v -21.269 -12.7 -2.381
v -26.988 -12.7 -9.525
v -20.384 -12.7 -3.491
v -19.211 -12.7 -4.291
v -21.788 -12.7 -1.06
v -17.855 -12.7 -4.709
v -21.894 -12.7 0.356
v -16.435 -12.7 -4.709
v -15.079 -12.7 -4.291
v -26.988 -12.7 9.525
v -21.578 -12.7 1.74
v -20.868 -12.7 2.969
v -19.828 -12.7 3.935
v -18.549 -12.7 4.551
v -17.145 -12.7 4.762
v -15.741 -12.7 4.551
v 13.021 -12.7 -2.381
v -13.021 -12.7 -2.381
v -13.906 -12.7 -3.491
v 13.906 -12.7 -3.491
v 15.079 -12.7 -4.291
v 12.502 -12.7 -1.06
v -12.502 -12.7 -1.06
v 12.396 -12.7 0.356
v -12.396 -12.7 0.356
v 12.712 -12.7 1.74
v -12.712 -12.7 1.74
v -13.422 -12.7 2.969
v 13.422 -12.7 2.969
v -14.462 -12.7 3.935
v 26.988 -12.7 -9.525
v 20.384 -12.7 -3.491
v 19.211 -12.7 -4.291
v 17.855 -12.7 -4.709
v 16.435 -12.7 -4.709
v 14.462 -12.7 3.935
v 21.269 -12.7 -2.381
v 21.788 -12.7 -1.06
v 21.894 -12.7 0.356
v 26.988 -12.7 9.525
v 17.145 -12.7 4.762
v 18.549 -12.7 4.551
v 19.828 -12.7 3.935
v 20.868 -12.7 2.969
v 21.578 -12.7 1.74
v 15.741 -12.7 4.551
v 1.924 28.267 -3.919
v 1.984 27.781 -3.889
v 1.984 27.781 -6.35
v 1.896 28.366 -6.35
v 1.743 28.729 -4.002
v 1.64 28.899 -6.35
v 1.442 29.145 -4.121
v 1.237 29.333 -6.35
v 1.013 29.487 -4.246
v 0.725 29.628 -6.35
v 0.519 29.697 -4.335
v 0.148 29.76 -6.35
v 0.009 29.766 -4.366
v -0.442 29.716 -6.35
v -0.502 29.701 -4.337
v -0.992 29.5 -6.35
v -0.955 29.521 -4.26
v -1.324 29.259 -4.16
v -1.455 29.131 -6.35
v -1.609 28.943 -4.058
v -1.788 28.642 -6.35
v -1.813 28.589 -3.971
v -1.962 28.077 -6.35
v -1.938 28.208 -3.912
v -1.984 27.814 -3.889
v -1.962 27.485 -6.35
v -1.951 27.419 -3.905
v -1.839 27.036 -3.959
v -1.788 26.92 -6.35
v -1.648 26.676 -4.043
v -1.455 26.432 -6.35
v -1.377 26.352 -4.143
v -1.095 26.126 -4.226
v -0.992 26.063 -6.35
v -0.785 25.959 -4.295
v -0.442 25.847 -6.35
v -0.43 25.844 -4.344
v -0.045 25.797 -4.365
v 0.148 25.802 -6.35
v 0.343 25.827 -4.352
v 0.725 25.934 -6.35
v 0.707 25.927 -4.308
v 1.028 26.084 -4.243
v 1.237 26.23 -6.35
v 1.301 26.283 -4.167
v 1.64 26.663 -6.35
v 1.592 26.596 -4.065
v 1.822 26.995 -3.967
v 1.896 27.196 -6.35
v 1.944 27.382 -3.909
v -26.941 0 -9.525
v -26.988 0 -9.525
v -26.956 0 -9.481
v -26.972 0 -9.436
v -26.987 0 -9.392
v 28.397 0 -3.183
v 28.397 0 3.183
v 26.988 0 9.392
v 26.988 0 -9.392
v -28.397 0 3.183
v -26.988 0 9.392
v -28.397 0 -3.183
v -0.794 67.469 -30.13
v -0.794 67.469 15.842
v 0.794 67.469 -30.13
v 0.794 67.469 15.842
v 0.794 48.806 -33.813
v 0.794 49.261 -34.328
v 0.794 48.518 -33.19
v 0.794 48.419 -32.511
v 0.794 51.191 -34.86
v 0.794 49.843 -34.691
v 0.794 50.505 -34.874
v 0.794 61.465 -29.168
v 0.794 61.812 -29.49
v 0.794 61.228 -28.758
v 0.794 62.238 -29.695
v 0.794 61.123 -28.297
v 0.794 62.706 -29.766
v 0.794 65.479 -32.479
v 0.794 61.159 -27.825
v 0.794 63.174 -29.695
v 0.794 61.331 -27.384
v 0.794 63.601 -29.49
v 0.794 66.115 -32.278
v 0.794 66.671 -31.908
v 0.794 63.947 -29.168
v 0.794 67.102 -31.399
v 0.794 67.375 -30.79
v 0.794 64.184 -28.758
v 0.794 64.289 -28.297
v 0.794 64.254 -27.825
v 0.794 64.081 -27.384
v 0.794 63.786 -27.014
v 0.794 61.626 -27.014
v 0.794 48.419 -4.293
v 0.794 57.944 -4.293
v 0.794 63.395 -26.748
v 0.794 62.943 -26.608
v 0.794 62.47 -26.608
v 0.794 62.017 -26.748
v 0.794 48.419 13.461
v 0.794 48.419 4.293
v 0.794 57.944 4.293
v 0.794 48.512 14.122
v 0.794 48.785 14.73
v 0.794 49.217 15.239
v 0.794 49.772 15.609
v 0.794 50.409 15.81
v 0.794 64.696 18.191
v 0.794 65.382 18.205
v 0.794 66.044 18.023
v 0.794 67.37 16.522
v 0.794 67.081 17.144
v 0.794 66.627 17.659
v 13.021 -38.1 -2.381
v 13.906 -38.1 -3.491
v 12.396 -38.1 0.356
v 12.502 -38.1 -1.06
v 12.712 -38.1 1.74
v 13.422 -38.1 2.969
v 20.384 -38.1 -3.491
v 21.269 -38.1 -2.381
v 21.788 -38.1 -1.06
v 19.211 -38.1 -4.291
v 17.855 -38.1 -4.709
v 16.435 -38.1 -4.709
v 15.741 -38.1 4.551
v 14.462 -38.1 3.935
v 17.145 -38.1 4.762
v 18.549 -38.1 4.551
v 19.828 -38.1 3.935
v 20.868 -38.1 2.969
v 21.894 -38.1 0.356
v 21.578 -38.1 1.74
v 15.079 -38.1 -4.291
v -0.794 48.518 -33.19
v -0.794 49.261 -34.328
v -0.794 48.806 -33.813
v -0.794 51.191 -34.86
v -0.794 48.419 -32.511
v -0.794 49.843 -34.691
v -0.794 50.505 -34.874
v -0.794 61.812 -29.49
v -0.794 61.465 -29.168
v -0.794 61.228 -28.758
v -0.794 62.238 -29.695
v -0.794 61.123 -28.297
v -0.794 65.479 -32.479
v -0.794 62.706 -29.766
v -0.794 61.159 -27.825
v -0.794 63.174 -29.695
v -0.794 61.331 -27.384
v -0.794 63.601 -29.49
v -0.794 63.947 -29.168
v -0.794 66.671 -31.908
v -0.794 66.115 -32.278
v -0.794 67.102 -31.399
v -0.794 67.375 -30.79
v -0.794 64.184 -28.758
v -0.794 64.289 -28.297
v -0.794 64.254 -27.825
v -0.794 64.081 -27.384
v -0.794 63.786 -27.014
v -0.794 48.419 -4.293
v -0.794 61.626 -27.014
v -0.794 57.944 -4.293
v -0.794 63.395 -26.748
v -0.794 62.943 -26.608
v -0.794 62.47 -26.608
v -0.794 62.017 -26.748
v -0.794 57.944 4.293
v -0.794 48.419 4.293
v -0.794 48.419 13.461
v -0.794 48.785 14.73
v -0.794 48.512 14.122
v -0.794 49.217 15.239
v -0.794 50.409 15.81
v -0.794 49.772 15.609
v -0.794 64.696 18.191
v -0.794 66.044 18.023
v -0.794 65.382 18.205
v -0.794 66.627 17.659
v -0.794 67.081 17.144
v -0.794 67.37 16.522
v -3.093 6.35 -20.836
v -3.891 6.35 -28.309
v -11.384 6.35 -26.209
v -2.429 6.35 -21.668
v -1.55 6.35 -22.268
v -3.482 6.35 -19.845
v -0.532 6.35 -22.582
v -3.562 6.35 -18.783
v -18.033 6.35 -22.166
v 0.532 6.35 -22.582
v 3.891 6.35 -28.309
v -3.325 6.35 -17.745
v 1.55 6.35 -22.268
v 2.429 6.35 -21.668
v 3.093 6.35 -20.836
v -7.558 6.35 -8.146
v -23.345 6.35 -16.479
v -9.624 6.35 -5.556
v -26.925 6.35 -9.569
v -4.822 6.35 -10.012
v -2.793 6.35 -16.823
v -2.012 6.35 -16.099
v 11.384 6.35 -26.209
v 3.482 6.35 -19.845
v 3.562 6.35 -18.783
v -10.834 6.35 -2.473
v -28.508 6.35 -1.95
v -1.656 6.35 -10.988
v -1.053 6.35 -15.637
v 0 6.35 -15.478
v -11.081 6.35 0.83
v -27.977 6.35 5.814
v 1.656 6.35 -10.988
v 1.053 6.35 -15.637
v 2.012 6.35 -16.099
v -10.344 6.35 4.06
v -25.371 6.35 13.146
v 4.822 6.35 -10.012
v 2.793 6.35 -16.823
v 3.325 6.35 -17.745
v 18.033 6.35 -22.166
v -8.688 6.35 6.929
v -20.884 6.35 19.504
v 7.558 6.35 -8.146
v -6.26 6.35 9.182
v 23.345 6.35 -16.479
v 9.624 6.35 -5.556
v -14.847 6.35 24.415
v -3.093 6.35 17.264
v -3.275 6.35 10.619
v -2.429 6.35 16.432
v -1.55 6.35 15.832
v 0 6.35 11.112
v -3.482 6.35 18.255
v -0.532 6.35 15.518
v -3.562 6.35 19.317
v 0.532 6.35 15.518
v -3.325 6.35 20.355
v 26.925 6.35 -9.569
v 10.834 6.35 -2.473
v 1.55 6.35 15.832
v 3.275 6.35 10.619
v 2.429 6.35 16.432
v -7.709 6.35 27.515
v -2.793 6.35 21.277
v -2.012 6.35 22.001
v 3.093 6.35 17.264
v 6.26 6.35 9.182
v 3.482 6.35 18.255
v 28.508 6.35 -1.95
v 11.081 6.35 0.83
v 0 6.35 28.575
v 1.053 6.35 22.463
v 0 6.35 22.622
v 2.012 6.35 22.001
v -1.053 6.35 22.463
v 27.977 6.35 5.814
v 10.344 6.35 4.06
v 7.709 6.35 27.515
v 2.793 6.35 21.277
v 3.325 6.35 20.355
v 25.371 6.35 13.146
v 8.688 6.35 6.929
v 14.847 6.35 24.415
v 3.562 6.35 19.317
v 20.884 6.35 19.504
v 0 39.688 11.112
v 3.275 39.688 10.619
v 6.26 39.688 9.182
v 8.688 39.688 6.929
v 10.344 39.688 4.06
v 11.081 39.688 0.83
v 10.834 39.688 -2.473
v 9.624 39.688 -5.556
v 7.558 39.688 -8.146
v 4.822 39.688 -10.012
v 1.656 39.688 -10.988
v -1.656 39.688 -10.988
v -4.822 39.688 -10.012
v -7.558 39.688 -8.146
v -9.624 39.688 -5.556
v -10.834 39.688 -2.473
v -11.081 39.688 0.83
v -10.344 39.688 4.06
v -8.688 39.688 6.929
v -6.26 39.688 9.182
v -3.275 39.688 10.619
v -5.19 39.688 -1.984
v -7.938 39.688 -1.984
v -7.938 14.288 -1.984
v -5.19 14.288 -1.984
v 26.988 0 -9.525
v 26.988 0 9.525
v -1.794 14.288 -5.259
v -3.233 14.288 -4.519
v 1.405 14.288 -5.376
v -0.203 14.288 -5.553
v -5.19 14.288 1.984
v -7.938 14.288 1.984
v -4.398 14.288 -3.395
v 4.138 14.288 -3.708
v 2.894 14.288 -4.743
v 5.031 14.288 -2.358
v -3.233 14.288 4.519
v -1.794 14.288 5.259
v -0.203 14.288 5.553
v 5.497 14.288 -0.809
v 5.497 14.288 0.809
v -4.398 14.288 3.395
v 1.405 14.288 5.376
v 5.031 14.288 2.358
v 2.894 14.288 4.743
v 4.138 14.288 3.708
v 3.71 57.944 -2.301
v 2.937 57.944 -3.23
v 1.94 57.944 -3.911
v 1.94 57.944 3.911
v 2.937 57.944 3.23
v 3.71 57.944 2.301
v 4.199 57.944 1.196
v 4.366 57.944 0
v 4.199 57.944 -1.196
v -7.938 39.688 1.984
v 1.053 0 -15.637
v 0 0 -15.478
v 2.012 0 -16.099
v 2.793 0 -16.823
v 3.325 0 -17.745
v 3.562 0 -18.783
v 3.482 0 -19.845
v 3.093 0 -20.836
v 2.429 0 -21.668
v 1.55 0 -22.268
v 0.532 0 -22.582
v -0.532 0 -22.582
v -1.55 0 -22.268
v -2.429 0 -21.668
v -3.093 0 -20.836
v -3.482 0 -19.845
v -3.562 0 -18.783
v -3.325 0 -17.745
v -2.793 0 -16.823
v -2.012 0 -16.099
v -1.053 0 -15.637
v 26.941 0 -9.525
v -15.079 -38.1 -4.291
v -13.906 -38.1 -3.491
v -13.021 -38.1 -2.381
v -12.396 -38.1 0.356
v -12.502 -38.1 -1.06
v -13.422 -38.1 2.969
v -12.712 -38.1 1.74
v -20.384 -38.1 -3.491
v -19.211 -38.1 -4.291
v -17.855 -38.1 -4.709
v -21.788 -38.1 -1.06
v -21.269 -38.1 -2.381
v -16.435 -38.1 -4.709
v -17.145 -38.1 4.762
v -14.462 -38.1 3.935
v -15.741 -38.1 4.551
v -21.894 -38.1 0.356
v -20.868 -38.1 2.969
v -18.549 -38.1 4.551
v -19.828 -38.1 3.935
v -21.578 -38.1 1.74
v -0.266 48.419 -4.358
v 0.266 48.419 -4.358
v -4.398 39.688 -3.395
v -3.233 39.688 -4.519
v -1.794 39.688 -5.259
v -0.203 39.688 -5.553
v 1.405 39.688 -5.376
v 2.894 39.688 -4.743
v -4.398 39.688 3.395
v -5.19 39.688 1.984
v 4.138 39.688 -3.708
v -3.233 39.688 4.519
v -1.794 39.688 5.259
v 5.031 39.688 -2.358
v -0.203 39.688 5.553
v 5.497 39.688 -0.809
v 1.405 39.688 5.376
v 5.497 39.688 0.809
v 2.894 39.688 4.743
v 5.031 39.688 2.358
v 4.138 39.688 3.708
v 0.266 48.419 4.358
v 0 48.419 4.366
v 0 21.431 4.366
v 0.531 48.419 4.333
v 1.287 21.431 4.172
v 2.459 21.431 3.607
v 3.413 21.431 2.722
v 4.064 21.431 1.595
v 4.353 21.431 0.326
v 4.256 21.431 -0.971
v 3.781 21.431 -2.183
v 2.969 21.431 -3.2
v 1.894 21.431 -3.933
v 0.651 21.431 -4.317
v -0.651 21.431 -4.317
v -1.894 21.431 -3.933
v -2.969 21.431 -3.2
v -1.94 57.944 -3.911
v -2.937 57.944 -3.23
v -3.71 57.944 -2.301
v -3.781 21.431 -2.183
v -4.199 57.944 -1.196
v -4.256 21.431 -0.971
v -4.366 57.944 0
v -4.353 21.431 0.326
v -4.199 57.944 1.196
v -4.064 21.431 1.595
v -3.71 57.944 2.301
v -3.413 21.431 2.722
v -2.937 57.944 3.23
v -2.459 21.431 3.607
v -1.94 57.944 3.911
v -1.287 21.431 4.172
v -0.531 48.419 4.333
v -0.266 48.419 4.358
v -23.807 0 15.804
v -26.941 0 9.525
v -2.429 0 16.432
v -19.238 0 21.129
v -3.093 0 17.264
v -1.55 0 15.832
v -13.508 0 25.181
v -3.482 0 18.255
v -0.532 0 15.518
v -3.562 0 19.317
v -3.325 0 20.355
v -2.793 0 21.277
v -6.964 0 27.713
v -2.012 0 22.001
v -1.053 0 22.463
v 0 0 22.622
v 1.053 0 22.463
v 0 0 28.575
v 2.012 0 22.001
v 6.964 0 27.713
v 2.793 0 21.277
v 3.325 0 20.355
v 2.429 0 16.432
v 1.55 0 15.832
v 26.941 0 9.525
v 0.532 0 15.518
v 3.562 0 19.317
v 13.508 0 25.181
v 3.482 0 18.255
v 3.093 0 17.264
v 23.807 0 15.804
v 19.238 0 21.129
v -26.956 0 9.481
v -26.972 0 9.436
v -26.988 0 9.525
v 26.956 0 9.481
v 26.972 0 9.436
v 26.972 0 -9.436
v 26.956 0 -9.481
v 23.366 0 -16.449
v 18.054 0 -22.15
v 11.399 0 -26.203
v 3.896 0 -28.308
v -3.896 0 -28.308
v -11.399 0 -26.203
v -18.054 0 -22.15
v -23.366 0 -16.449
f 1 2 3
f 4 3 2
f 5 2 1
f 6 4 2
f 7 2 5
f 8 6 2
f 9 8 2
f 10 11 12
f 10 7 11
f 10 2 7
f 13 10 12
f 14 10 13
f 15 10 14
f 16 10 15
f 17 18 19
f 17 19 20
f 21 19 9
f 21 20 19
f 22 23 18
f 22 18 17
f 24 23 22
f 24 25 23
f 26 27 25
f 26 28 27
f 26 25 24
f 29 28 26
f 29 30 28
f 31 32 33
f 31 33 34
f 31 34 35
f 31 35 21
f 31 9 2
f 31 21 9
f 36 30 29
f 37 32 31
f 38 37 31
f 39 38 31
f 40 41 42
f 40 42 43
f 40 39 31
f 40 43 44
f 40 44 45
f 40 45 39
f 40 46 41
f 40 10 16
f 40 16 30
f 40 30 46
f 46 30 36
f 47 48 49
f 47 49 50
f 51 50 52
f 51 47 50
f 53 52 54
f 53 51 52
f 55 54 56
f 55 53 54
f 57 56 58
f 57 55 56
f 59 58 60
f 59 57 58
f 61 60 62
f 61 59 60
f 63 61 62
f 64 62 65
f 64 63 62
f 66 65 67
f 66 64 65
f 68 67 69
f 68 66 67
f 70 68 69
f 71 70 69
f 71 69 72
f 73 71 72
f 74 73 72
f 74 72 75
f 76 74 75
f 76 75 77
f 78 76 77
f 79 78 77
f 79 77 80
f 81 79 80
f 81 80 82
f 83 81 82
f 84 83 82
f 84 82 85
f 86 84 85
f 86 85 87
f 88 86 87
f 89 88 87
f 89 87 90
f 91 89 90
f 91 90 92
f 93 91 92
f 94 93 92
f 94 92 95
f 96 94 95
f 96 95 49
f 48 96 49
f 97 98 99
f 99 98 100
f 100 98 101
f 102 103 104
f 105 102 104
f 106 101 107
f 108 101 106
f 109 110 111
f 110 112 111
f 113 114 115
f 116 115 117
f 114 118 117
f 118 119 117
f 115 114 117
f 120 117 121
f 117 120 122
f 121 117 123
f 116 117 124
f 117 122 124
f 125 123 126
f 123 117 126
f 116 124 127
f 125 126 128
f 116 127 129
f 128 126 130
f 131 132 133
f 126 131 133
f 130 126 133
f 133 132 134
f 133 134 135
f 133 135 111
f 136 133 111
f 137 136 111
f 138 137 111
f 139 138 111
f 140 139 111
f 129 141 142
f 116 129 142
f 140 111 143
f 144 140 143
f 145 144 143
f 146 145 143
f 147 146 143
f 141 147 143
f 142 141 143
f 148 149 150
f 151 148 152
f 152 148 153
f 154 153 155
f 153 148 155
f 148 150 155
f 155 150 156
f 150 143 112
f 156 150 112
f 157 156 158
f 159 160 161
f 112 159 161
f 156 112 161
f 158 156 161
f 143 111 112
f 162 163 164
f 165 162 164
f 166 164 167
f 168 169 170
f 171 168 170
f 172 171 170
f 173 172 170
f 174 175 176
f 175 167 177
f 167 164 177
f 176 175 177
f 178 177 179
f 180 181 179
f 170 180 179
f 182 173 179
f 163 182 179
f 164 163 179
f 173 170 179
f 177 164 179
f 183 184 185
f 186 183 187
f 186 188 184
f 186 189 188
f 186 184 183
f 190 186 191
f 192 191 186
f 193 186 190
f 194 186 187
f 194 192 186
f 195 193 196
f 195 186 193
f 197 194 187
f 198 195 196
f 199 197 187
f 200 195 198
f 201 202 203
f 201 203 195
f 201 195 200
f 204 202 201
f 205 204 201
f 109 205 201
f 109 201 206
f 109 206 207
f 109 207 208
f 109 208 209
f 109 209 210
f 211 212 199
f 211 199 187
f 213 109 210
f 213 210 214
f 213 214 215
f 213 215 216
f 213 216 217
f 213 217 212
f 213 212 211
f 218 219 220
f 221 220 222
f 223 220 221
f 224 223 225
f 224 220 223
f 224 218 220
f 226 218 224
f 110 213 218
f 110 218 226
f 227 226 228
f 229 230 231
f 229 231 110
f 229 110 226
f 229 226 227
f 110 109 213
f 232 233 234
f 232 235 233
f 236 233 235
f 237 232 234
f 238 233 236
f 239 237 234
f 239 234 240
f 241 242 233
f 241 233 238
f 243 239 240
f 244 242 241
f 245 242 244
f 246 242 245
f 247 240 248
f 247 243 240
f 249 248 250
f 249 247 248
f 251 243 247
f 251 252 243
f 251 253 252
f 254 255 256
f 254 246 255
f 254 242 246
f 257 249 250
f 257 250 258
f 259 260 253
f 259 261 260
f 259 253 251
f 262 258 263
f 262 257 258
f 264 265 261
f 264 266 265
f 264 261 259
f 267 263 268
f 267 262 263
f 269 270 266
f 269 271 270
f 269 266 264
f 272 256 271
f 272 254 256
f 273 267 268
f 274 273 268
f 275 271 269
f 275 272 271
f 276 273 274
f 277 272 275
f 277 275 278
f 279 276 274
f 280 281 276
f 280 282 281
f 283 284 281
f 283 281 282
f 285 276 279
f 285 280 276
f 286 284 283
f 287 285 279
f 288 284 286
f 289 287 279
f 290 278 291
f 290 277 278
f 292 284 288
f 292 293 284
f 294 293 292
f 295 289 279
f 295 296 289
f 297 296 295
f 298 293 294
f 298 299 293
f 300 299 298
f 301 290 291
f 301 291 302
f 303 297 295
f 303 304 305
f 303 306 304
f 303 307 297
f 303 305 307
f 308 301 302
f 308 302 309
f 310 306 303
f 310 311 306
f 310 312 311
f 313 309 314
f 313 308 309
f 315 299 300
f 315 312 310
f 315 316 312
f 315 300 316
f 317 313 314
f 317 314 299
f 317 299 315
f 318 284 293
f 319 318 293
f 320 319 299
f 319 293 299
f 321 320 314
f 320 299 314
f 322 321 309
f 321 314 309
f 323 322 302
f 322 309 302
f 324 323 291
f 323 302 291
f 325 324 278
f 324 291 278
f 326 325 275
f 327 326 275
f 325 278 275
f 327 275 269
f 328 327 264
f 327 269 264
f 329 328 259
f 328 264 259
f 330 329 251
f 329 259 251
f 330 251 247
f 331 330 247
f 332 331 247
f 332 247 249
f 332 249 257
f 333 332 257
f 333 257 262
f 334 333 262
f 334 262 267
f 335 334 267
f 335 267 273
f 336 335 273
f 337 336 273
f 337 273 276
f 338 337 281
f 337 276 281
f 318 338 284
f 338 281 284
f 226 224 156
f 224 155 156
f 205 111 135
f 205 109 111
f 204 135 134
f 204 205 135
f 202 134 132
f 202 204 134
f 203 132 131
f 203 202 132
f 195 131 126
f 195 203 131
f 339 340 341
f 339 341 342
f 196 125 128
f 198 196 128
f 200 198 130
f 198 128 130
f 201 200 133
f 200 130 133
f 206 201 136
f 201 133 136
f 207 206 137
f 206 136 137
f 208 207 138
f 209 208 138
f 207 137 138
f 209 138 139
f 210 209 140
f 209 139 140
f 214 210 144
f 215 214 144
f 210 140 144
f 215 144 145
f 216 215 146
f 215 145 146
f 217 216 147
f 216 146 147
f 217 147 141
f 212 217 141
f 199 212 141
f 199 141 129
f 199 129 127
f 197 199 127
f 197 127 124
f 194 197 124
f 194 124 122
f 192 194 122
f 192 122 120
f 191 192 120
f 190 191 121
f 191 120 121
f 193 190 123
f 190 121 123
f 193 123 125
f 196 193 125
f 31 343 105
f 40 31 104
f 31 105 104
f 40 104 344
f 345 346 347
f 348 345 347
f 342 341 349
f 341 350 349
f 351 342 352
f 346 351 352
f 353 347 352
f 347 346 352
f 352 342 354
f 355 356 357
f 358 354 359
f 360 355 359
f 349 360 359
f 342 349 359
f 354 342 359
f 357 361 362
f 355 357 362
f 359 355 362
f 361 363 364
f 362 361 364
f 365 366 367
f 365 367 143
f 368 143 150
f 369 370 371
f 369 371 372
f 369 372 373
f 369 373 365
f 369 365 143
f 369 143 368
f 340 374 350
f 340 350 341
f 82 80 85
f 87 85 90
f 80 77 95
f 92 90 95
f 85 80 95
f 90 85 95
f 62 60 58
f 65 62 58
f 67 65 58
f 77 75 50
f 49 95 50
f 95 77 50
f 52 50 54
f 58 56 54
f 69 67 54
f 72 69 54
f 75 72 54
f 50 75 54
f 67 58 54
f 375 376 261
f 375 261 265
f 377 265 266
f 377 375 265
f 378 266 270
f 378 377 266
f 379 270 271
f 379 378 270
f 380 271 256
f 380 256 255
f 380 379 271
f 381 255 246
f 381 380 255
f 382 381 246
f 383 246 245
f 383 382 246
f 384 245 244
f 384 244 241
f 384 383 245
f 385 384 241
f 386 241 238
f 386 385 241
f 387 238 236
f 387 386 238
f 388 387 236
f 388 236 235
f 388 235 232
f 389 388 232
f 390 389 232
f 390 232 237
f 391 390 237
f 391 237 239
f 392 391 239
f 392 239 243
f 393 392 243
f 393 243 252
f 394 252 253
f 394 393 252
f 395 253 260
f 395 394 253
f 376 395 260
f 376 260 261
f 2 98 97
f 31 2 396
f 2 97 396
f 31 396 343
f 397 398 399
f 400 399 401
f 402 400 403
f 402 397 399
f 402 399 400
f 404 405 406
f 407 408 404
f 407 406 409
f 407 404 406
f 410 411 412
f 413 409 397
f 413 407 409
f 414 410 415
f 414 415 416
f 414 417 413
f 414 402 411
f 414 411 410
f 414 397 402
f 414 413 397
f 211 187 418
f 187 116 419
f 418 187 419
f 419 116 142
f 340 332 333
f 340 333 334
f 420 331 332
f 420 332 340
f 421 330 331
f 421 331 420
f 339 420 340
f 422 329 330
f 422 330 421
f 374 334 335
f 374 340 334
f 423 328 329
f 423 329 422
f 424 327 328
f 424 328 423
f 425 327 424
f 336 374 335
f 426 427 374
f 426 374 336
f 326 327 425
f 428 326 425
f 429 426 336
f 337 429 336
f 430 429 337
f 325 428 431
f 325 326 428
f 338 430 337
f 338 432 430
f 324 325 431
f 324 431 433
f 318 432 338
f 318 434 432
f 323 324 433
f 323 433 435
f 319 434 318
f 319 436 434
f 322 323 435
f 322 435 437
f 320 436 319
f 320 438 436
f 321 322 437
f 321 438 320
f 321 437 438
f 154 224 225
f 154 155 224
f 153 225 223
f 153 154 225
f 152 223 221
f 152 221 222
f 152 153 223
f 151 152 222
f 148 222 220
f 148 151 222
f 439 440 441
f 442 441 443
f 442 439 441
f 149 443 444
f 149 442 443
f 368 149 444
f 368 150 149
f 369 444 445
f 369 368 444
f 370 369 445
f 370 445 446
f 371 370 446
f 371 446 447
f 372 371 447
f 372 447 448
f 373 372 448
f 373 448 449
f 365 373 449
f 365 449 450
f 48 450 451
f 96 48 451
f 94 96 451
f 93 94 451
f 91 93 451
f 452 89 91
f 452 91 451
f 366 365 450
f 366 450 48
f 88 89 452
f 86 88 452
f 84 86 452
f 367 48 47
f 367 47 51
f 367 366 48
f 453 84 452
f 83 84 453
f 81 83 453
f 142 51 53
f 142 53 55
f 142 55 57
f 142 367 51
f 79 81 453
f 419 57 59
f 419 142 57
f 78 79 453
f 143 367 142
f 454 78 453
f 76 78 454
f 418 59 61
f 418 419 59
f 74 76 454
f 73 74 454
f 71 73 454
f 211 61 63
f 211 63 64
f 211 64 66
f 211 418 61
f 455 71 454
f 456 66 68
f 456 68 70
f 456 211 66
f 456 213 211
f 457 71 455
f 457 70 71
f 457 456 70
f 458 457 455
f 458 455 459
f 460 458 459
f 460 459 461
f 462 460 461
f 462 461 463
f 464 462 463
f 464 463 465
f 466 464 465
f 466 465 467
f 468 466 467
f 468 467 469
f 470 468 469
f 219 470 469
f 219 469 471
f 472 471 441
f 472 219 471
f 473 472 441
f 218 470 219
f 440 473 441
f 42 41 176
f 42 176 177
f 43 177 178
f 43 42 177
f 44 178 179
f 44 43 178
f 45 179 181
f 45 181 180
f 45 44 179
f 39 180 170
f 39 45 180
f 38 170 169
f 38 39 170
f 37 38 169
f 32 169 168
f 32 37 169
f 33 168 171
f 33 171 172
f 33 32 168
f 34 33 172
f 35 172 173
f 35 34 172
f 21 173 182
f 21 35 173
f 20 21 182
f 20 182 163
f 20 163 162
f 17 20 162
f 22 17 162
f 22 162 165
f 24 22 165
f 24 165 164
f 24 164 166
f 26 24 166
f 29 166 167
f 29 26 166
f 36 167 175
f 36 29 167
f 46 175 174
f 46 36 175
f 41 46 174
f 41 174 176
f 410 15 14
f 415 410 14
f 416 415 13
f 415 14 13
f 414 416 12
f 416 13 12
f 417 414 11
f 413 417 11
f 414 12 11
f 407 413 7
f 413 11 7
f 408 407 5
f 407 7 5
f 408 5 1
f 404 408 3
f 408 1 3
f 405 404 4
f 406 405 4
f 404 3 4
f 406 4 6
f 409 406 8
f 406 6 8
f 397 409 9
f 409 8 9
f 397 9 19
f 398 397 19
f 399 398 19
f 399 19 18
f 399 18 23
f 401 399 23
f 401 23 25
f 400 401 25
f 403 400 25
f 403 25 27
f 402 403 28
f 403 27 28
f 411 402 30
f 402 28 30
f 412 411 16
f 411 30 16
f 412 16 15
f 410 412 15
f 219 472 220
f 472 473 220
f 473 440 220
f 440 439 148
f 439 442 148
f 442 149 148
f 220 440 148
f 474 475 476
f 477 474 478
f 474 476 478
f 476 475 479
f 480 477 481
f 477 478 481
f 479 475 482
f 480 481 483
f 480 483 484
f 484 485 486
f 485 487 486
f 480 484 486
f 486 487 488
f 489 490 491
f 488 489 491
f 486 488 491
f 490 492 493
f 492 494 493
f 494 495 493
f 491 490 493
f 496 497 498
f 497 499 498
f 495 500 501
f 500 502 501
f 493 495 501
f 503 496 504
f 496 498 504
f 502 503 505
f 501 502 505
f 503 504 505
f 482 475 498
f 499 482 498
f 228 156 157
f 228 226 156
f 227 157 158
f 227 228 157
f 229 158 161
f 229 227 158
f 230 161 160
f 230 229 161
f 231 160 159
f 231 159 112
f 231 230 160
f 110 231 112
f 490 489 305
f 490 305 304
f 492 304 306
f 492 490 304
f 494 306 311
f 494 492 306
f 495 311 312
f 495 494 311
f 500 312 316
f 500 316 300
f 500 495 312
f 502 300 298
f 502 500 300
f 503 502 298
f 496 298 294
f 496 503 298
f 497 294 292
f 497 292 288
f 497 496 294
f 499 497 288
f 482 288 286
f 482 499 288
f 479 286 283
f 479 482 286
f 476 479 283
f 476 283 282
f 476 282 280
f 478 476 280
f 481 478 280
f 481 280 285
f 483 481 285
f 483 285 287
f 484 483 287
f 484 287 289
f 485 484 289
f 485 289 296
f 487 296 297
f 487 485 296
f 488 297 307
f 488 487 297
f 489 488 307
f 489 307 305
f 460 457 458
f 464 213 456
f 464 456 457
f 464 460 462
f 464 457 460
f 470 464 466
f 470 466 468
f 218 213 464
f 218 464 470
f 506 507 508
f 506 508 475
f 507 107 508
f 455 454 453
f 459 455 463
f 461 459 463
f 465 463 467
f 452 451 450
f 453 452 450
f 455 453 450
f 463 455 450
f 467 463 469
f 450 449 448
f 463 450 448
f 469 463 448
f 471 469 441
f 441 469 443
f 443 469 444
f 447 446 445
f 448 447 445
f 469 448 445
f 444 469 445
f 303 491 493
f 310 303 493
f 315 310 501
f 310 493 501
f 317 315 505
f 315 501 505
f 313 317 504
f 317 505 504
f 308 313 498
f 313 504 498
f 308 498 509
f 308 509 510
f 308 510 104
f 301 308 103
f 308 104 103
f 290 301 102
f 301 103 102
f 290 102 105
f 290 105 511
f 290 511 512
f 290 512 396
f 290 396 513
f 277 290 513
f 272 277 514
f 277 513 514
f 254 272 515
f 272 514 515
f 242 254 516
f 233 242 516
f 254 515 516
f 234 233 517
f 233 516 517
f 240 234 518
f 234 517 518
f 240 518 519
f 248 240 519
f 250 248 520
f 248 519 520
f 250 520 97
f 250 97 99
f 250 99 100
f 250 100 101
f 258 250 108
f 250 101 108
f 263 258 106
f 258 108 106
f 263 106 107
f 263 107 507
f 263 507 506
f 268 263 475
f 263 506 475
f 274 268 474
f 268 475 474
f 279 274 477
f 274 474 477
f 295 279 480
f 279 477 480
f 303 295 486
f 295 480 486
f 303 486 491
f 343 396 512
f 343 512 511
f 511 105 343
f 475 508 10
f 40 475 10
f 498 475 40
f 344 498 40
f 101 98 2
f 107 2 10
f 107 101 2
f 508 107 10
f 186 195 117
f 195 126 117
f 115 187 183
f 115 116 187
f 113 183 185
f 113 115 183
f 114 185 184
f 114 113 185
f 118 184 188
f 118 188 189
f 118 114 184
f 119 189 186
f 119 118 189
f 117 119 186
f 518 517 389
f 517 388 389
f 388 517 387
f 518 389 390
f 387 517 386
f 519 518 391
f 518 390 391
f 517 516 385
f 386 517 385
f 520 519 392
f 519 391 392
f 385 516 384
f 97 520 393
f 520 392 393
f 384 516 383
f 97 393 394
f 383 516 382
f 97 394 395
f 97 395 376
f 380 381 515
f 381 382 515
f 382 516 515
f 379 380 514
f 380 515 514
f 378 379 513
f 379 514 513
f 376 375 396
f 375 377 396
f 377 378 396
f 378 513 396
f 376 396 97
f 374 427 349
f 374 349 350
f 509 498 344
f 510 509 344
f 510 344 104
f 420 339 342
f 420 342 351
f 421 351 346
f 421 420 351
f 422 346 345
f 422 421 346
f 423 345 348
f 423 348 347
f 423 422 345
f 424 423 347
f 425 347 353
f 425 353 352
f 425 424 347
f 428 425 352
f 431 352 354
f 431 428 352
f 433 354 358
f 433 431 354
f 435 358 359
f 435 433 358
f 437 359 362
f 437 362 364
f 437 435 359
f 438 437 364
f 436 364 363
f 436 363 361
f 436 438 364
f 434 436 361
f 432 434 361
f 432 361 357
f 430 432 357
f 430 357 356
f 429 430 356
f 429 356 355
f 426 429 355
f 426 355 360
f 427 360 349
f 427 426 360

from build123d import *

# Parameters (mm, degrees)
SKETCH1_R          = 28.575
SKETCH1_R_2        = 3.571875
EXTRUDE1_DEPTH     = 6.35
SKETCH2_R          = 11.1125
EXTRUDE2_DEPTH     = 33.3375
CUT_EXTRUDE1_DEPTH = 25.4
SKETCH4_W          = 53.975
SKETCH4_H          = 19.05
EXTRUDE3_DEPTH     = 12.7
SKETCH5_R          = 4.7625
EXTRUDE4_DEPTH     = 25.4
SKETCH6_R          = 4.365625
EXTRUDE5_DEPTH     = 18.25625
EXTRUDE6_DEPTH     = 0.79375
FILLET1_R          = 2.38125
SKETCH8_R          = 1.5875
CUT_EXTRUDE2_DEPTH = 1.5875
SKETCH9_R          = 1.984375
EXTRUDE7_DEPTH     = 6.35


with BuildPart() as part:
    # Sketch1 → Extrude1 (new body)
    with BuildSketch(Plane(origin=(0, 0, 0), x_dir=(1, 0, 0), z_dir=(0, 1, 0))):
        with Locations(Location((0, 0, 0), (0, 0, 270))):
            Circle(SKETCH1_R)
        with Locations(Location((0, 19.05, 0), (0, 0, 270))):
            Circle(SKETCH1_R_2, mode=Mode.SUBTRACT)
        with Locations(Location((0, -19.05, 0), (0, 0, 270))):
            Circle(SKETCH1_R_2, mode=Mode.SUBTRACT)
    extrude(amount=EXTRUDE1_DEPTH)

    # Sketch2 → Extrude2 (add)
    with BuildSketch(Plane(origin=(0, 6.35, 0), x_dir=(-1, 0, 0), z_dir=(0, 1, 0))):
        with Locations(Location((0, 0, 0), (0, 0, 90))):
            Circle(SKETCH2_R)
    extrude(amount=EXTRUDE2_DEPTH)

    # Sketch3 → Cut-Extrude1 (cut)
    with BuildSketch(Plane(origin=(0, 39.6875, 0), x_dir=(-1, 0, 0), z_dir=(0, 1, 0))):
        with BuildLine():
            Line((7.9375, -1.984375), (5.189814055, -1.984375))
            ThreePointArc((5.189814055, -1.984375), (-5.55625, 0), (5.189814055, 1.984375))
            Line((5.189814055, 1.984375), (7.9375, 1.984375))
            Line((7.9375, 1.984375), (7.9375, -1.984375))
        make_face()
    extrude(amount=-CUT_EXTRUDE1_DEPTH, mode=Mode.SUBTRACT)

    # Sketch4 → Extrude3 (add)
    with BuildSketch(Plane.XZ):
        Rectangle(SKETCH4_W, SKETCH4_H)
    extrude(amount=EXTRUDE3_DEPTH)

    # Sketch5 → Extrude4 (add)
    with BuildSketch(Plane.XZ.offset(12.7)):
        with Locations(Location((-17.145, 0, 0), (0, 0, 90))):
            Circle(SKETCH5_R)
    extrude4 = extrude(amount=EXTRUDE4_DEPTH)

    # Mirror1: Extrude4 across plane
    add(extrude4.mirror(Plane(origin=(0, 0, 0), x_dir=(0, 0, 1), z_dir=(1, 0, 0))))


with BuildPart() as body_2:
    # Sketch6 → Extrude5 (new, symmetric)
    with BuildSketch(Plane(origin=(0, 39.6875, 0), x_dir=(-1, 0, 0), z_dir=(0, 1, 0))):
        with Locations(Location((0, 0, 0), (0, 0, 90))):
            Circle(SKETCH6_R)
    extrude(amount=EXTRUDE5_DEPTH, both=True)

    # Sketch7 → Extrude6 (add, symmetric)
    with BuildSketch(Plane(origin=(0, 0, 0), x_dir=(0, 0, -1), z_dir=(1, 0, 0))):
        Polygon((-15.478125, 48.41875), (-18.653125, 67.46875), (32.146875, 67.46875), (35.321875, 48.41875), align=None)
    extrude(amount=EXTRUDE6_DEPTH, both=True)

    # Fillet1
    fillet1_edges = [body_2.edges().sort_by_distance(p)[0] for p in [
        (0, 48.41875, 15.478125),
        (0, 48.41875, -35.321875),
        (0, 67.46875, -32.146875),
        (0, 67.46875, 18.653125),
    ]]
    fillet(fillet1_edges, radius=FILLET1_R)

    # Sketch8 → Cut-Extrude2 (cut)
    with BuildSketch(Plane(origin=(0.79375, 0, 0), x_dir=(0, 0, -1), z_dir=(1, 0, 0))):
        with Locations((28.178125, 62.70625)):
            Circle(SKETCH8_R)
    extrude(amount=-CUT_EXTRUDE2_DEPTH, mode=Mode.SUBTRACT)

    # Sketch9 → Extrude7 (add)
    with BuildSketch(Plane.XY):
        with Locations((0, 27.78125)):
            Circle(SKETCH9_R)
    extrude(amount=-EXTRUDE7_DEPTH)


solid = Compound([part.part, body_2.part])
